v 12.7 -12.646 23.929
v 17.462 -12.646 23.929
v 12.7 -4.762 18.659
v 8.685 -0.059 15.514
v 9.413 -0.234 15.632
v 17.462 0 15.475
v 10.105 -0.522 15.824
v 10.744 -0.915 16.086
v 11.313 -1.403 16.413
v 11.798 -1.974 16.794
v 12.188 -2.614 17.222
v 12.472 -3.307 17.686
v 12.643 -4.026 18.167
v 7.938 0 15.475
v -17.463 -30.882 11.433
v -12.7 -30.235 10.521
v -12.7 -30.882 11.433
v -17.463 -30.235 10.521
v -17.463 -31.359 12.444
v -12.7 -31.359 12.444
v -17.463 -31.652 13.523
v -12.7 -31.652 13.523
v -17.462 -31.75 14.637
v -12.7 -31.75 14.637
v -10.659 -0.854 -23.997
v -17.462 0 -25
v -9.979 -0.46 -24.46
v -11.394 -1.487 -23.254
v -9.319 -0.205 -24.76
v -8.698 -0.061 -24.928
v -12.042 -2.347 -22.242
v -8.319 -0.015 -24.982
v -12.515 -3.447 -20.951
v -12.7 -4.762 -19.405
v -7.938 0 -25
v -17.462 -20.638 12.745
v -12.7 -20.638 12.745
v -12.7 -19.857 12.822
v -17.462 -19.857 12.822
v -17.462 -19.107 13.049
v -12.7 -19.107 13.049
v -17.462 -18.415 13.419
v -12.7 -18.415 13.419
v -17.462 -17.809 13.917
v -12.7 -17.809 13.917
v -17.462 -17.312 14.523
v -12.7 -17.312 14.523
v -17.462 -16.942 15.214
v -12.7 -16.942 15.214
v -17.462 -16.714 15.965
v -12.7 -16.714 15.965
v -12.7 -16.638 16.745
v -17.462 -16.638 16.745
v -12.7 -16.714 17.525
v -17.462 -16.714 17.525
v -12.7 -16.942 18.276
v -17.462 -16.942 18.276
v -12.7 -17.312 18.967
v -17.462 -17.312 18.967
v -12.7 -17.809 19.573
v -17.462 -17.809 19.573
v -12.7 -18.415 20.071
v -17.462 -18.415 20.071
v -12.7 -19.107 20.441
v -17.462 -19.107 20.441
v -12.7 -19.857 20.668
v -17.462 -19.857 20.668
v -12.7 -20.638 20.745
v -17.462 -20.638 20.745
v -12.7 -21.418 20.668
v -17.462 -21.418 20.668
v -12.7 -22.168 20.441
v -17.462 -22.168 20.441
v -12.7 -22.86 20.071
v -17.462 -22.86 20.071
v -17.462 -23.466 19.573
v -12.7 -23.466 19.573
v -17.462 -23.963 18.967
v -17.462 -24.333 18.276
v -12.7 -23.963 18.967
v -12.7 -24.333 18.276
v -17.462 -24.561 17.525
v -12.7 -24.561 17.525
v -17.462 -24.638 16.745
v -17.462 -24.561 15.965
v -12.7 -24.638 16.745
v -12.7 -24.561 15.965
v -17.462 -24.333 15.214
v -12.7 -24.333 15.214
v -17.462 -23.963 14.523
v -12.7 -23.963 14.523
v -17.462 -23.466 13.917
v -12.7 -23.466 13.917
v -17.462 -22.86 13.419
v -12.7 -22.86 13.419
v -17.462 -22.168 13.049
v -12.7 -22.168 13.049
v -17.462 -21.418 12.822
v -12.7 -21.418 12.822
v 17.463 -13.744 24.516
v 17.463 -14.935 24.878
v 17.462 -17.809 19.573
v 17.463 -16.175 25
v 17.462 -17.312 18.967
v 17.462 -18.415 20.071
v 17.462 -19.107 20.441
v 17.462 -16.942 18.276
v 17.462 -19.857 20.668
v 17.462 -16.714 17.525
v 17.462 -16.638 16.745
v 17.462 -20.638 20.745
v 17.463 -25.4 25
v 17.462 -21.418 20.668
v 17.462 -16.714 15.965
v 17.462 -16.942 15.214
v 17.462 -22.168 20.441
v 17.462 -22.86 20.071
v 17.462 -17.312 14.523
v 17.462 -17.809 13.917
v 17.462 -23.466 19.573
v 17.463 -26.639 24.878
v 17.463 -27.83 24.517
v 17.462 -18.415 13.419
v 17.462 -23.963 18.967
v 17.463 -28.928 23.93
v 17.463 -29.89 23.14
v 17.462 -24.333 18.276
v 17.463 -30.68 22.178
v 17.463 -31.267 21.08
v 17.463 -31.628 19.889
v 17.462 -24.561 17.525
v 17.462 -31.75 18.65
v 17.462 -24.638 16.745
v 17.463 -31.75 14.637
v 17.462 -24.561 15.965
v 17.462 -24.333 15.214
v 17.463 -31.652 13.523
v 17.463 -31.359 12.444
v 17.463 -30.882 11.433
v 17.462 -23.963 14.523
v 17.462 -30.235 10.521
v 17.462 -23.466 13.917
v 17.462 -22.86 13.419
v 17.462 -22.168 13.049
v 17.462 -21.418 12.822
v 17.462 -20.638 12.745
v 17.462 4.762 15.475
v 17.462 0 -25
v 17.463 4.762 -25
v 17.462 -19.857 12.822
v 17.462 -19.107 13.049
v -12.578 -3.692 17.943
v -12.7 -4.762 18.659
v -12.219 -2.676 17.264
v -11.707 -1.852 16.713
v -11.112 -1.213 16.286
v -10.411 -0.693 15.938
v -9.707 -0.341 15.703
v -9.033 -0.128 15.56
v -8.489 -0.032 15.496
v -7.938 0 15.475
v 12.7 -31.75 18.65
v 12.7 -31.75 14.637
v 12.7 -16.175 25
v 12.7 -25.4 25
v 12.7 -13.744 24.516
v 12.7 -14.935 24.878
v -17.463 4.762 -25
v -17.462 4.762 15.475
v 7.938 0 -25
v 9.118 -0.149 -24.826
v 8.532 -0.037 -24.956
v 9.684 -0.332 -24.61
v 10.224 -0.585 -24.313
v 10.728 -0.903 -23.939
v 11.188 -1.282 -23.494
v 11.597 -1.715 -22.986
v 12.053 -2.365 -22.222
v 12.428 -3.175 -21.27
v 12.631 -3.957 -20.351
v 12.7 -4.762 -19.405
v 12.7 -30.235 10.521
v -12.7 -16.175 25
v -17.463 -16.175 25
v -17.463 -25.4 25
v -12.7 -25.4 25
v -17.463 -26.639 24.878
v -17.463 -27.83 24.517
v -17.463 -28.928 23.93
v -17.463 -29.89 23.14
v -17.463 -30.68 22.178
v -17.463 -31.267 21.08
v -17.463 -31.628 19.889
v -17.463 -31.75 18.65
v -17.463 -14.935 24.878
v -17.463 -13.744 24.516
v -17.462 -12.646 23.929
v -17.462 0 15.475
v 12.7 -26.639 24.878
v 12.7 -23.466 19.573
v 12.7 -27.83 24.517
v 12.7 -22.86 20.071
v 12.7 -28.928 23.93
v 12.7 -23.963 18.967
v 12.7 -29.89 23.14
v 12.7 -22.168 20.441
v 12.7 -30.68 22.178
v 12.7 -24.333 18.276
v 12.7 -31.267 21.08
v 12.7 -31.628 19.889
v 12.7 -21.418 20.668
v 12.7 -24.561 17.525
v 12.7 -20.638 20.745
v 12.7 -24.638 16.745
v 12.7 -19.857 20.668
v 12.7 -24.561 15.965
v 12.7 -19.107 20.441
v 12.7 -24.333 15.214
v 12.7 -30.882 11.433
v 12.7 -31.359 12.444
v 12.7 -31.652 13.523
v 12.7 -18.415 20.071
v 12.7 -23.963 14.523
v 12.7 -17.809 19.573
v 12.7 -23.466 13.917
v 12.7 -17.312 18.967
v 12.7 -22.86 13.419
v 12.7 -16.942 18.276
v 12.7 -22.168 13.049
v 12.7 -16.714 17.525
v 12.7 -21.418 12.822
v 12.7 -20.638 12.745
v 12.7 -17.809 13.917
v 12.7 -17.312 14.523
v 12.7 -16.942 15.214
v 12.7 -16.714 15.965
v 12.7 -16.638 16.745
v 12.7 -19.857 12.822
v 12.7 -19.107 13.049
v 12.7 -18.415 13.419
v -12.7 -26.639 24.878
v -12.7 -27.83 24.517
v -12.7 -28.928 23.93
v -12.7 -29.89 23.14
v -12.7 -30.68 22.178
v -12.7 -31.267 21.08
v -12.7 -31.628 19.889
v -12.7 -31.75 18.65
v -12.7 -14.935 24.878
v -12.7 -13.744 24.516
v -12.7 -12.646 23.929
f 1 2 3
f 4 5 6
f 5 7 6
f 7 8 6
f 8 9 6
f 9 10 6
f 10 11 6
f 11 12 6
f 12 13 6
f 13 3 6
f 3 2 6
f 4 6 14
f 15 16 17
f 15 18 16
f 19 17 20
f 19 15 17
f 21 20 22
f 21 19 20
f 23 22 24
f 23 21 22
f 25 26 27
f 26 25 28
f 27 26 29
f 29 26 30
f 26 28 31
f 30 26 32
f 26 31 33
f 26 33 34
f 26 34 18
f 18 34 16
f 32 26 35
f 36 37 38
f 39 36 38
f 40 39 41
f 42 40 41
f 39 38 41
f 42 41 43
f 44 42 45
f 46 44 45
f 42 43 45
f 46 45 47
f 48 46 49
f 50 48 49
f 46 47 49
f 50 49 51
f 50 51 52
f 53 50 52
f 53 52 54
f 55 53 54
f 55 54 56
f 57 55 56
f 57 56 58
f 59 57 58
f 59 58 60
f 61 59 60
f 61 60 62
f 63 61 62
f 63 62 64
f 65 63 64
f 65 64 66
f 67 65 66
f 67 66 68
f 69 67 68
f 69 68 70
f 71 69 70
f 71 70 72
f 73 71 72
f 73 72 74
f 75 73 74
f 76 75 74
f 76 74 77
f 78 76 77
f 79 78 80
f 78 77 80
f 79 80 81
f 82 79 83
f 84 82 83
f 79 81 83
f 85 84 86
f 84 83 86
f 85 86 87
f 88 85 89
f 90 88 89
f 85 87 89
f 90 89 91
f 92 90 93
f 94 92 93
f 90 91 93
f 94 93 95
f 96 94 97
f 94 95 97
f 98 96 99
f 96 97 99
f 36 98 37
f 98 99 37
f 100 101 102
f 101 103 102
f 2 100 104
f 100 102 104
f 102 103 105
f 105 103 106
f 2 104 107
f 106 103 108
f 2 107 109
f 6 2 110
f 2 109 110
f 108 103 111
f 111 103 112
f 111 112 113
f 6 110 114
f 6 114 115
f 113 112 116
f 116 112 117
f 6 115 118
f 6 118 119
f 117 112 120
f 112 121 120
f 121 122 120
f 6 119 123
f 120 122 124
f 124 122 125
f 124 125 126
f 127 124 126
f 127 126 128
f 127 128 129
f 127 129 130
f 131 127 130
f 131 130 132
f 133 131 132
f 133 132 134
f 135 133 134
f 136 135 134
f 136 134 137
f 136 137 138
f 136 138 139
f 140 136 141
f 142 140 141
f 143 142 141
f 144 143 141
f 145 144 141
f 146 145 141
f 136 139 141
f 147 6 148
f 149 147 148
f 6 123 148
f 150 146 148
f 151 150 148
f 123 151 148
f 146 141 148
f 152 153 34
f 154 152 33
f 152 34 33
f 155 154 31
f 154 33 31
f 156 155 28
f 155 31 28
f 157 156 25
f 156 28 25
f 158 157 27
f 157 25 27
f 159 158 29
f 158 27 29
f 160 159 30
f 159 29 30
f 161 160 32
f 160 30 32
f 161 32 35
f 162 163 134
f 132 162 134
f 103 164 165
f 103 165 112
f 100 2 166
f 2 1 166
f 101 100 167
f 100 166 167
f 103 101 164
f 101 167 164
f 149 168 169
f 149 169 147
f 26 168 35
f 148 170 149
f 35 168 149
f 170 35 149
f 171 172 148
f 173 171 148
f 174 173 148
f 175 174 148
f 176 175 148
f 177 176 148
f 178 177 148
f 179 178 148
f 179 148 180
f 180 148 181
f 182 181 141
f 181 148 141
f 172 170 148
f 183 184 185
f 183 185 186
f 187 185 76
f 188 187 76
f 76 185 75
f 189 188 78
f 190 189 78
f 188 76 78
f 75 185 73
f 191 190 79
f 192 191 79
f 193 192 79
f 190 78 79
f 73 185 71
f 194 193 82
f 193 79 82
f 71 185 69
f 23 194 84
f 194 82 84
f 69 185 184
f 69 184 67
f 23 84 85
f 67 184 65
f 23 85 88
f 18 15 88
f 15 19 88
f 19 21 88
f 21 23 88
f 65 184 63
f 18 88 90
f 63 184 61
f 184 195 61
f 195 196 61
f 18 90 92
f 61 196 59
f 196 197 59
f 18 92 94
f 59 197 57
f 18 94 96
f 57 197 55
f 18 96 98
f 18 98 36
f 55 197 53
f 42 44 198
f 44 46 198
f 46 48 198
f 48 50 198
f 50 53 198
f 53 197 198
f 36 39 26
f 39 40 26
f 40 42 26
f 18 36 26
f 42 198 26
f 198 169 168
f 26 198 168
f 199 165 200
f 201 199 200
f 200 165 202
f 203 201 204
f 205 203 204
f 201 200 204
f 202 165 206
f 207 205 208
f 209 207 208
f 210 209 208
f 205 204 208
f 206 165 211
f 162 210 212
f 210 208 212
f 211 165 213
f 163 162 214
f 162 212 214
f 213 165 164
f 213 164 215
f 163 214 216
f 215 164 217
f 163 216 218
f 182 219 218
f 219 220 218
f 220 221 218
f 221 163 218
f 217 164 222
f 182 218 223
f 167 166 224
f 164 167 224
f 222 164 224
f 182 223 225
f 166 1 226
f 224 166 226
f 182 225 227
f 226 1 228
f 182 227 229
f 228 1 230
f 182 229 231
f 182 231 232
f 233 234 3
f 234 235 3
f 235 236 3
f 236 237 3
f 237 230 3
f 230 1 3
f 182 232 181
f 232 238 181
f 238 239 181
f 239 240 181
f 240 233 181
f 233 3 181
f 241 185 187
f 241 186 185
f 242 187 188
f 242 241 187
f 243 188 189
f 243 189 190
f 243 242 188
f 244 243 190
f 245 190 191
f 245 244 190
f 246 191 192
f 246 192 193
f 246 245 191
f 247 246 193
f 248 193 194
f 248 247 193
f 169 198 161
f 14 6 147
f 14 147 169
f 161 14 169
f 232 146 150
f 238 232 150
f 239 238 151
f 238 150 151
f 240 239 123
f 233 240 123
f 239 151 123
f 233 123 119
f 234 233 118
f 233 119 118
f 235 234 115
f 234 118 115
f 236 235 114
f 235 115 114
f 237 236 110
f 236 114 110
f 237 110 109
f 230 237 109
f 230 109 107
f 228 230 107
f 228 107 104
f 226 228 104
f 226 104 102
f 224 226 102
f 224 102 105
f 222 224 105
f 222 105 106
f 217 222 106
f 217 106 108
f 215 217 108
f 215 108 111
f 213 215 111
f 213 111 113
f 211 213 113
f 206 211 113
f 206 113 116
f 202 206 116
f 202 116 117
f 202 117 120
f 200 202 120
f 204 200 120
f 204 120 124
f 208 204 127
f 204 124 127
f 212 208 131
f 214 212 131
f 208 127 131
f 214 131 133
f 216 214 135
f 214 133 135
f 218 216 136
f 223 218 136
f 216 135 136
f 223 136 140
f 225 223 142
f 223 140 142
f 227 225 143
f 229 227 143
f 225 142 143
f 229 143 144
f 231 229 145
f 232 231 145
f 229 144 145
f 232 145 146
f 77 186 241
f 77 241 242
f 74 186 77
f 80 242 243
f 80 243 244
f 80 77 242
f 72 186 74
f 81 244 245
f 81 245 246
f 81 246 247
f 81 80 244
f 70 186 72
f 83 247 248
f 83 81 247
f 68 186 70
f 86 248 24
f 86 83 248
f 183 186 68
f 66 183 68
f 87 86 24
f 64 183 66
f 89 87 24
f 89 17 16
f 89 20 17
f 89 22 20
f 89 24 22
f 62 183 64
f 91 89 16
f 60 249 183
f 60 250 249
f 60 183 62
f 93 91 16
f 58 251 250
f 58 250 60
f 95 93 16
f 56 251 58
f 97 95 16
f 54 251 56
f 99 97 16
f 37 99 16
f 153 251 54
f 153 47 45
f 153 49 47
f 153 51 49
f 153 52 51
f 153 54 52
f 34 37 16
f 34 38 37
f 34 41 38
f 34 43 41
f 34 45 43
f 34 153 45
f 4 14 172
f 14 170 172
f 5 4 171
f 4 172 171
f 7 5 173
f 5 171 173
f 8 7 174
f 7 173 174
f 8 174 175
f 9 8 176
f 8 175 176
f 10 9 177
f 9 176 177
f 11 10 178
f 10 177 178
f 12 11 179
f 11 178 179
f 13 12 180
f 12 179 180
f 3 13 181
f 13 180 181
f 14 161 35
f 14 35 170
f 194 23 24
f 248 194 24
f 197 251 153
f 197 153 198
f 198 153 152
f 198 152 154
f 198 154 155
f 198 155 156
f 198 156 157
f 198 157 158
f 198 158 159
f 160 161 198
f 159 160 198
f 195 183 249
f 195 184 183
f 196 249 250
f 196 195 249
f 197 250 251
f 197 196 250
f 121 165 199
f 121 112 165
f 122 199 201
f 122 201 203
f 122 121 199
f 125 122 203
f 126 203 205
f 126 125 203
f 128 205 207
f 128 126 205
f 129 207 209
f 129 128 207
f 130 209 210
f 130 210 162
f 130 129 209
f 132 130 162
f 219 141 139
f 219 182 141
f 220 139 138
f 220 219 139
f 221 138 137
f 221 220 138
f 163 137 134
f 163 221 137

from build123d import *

# Parameters (mm, degrees)
SKETCH1_W           = 4.7625
SKETCH1_H           = 50
SKETCH1_W_2         = 25.4
BOSS_EXTRUDE1_DEPTH = 4.7625
SKETCH1_3_W         = 4.7625
SKETCH1_3_H         = 50
BOSS_EXTRUDE2_DEPTH = 31.75
SKETCH3_R           = 4
CUT_EXTRUDE1_DEPTH  = 35.925
FILLET1_R           = 6.35
FILLET2_R           = 4.7625


with BuildPart() as part:
    # Sketch1 → Boss-Extrude1 (new body)
    with BuildSketch(Plane(origin=(0, 0, 0), x_dir=(1, 0, 0), z_dir=(0, 1, 0))):
        with Locations((-15.08125, 0)):
            Rectangle(SKETCH1_W, SKETCH1_H)
        Rectangle(SKETCH1_W_2, SKETCH1_H)
        with Locations((15.08125, 0)):
            Rectangle(SKETCH1_W, SKETCH1_H)
    extrude(amount=BOSS_EXTRUDE1_DEPTH)

    # Sketch1<3> → Boss-Extrude2 (add)
    with BuildSketch(Plane(origin=(0, 0, 0), x_dir=(1, 0, 0), z_dir=(0, 1, 0))):
        with Locations((-15.08125, 0)):
            Rectangle(SKETCH1_3_W, SKETCH1_3_H)
        with Locations((15.08125, 0)):
            Rectangle(SKETCH1_3_W, SKETCH1_3_H)
    extrude(amount=-BOSS_EXTRUDE2_DEPTH)

    # Sketch3 → Cut-Extrude1 (cut, through all)
    with BuildSketch(Plane(origin=(17.4625, 0, 0), x_dir=(0, 0, -1), z_dir=(1, 0, 0))):
        Polygon((25, -31.75), (25, 0), (-12.3, -31.75), align=None)
        Polygon((-15.475, 0), (-15.475, 4.7625), (-25, 4.7625), (-25, 0), (-25, -14.247596398), align=None)
        with Locations((-16.745, -20.6375)):
            Circle(SKETCH3_R)
    extrude(amount=-CUT_EXTRUDE1_DEPTH, mode=Mode.SUBTRACT)

    # Fillet1
    fillet1_edges = [part.edges().sort_by_distance(p)[0] for p in [
        (-15.08125, -31.75, 25),
        (15.08125, -31.75, 25),
        (15.08125, -31.75, 12.3),
        (-15.08125, -31.75, 12.3),
        (15.08125, -14.247596398, 25),
        (-15.08125, -14.247596398, 25),
    ]]
    fillet(fillet1_edges, radius=FILLET1_R)

    # Fillet2
    fillet2_edges = [part.edges().sort_by_distance(p)[0] for p in [
        (12.7, 0, -4.7625),
        (-12.7, 0, -4.7625),
    ]]
    fillet(fillet2_edges, radius=FILLET2_R)


solid = part.part
